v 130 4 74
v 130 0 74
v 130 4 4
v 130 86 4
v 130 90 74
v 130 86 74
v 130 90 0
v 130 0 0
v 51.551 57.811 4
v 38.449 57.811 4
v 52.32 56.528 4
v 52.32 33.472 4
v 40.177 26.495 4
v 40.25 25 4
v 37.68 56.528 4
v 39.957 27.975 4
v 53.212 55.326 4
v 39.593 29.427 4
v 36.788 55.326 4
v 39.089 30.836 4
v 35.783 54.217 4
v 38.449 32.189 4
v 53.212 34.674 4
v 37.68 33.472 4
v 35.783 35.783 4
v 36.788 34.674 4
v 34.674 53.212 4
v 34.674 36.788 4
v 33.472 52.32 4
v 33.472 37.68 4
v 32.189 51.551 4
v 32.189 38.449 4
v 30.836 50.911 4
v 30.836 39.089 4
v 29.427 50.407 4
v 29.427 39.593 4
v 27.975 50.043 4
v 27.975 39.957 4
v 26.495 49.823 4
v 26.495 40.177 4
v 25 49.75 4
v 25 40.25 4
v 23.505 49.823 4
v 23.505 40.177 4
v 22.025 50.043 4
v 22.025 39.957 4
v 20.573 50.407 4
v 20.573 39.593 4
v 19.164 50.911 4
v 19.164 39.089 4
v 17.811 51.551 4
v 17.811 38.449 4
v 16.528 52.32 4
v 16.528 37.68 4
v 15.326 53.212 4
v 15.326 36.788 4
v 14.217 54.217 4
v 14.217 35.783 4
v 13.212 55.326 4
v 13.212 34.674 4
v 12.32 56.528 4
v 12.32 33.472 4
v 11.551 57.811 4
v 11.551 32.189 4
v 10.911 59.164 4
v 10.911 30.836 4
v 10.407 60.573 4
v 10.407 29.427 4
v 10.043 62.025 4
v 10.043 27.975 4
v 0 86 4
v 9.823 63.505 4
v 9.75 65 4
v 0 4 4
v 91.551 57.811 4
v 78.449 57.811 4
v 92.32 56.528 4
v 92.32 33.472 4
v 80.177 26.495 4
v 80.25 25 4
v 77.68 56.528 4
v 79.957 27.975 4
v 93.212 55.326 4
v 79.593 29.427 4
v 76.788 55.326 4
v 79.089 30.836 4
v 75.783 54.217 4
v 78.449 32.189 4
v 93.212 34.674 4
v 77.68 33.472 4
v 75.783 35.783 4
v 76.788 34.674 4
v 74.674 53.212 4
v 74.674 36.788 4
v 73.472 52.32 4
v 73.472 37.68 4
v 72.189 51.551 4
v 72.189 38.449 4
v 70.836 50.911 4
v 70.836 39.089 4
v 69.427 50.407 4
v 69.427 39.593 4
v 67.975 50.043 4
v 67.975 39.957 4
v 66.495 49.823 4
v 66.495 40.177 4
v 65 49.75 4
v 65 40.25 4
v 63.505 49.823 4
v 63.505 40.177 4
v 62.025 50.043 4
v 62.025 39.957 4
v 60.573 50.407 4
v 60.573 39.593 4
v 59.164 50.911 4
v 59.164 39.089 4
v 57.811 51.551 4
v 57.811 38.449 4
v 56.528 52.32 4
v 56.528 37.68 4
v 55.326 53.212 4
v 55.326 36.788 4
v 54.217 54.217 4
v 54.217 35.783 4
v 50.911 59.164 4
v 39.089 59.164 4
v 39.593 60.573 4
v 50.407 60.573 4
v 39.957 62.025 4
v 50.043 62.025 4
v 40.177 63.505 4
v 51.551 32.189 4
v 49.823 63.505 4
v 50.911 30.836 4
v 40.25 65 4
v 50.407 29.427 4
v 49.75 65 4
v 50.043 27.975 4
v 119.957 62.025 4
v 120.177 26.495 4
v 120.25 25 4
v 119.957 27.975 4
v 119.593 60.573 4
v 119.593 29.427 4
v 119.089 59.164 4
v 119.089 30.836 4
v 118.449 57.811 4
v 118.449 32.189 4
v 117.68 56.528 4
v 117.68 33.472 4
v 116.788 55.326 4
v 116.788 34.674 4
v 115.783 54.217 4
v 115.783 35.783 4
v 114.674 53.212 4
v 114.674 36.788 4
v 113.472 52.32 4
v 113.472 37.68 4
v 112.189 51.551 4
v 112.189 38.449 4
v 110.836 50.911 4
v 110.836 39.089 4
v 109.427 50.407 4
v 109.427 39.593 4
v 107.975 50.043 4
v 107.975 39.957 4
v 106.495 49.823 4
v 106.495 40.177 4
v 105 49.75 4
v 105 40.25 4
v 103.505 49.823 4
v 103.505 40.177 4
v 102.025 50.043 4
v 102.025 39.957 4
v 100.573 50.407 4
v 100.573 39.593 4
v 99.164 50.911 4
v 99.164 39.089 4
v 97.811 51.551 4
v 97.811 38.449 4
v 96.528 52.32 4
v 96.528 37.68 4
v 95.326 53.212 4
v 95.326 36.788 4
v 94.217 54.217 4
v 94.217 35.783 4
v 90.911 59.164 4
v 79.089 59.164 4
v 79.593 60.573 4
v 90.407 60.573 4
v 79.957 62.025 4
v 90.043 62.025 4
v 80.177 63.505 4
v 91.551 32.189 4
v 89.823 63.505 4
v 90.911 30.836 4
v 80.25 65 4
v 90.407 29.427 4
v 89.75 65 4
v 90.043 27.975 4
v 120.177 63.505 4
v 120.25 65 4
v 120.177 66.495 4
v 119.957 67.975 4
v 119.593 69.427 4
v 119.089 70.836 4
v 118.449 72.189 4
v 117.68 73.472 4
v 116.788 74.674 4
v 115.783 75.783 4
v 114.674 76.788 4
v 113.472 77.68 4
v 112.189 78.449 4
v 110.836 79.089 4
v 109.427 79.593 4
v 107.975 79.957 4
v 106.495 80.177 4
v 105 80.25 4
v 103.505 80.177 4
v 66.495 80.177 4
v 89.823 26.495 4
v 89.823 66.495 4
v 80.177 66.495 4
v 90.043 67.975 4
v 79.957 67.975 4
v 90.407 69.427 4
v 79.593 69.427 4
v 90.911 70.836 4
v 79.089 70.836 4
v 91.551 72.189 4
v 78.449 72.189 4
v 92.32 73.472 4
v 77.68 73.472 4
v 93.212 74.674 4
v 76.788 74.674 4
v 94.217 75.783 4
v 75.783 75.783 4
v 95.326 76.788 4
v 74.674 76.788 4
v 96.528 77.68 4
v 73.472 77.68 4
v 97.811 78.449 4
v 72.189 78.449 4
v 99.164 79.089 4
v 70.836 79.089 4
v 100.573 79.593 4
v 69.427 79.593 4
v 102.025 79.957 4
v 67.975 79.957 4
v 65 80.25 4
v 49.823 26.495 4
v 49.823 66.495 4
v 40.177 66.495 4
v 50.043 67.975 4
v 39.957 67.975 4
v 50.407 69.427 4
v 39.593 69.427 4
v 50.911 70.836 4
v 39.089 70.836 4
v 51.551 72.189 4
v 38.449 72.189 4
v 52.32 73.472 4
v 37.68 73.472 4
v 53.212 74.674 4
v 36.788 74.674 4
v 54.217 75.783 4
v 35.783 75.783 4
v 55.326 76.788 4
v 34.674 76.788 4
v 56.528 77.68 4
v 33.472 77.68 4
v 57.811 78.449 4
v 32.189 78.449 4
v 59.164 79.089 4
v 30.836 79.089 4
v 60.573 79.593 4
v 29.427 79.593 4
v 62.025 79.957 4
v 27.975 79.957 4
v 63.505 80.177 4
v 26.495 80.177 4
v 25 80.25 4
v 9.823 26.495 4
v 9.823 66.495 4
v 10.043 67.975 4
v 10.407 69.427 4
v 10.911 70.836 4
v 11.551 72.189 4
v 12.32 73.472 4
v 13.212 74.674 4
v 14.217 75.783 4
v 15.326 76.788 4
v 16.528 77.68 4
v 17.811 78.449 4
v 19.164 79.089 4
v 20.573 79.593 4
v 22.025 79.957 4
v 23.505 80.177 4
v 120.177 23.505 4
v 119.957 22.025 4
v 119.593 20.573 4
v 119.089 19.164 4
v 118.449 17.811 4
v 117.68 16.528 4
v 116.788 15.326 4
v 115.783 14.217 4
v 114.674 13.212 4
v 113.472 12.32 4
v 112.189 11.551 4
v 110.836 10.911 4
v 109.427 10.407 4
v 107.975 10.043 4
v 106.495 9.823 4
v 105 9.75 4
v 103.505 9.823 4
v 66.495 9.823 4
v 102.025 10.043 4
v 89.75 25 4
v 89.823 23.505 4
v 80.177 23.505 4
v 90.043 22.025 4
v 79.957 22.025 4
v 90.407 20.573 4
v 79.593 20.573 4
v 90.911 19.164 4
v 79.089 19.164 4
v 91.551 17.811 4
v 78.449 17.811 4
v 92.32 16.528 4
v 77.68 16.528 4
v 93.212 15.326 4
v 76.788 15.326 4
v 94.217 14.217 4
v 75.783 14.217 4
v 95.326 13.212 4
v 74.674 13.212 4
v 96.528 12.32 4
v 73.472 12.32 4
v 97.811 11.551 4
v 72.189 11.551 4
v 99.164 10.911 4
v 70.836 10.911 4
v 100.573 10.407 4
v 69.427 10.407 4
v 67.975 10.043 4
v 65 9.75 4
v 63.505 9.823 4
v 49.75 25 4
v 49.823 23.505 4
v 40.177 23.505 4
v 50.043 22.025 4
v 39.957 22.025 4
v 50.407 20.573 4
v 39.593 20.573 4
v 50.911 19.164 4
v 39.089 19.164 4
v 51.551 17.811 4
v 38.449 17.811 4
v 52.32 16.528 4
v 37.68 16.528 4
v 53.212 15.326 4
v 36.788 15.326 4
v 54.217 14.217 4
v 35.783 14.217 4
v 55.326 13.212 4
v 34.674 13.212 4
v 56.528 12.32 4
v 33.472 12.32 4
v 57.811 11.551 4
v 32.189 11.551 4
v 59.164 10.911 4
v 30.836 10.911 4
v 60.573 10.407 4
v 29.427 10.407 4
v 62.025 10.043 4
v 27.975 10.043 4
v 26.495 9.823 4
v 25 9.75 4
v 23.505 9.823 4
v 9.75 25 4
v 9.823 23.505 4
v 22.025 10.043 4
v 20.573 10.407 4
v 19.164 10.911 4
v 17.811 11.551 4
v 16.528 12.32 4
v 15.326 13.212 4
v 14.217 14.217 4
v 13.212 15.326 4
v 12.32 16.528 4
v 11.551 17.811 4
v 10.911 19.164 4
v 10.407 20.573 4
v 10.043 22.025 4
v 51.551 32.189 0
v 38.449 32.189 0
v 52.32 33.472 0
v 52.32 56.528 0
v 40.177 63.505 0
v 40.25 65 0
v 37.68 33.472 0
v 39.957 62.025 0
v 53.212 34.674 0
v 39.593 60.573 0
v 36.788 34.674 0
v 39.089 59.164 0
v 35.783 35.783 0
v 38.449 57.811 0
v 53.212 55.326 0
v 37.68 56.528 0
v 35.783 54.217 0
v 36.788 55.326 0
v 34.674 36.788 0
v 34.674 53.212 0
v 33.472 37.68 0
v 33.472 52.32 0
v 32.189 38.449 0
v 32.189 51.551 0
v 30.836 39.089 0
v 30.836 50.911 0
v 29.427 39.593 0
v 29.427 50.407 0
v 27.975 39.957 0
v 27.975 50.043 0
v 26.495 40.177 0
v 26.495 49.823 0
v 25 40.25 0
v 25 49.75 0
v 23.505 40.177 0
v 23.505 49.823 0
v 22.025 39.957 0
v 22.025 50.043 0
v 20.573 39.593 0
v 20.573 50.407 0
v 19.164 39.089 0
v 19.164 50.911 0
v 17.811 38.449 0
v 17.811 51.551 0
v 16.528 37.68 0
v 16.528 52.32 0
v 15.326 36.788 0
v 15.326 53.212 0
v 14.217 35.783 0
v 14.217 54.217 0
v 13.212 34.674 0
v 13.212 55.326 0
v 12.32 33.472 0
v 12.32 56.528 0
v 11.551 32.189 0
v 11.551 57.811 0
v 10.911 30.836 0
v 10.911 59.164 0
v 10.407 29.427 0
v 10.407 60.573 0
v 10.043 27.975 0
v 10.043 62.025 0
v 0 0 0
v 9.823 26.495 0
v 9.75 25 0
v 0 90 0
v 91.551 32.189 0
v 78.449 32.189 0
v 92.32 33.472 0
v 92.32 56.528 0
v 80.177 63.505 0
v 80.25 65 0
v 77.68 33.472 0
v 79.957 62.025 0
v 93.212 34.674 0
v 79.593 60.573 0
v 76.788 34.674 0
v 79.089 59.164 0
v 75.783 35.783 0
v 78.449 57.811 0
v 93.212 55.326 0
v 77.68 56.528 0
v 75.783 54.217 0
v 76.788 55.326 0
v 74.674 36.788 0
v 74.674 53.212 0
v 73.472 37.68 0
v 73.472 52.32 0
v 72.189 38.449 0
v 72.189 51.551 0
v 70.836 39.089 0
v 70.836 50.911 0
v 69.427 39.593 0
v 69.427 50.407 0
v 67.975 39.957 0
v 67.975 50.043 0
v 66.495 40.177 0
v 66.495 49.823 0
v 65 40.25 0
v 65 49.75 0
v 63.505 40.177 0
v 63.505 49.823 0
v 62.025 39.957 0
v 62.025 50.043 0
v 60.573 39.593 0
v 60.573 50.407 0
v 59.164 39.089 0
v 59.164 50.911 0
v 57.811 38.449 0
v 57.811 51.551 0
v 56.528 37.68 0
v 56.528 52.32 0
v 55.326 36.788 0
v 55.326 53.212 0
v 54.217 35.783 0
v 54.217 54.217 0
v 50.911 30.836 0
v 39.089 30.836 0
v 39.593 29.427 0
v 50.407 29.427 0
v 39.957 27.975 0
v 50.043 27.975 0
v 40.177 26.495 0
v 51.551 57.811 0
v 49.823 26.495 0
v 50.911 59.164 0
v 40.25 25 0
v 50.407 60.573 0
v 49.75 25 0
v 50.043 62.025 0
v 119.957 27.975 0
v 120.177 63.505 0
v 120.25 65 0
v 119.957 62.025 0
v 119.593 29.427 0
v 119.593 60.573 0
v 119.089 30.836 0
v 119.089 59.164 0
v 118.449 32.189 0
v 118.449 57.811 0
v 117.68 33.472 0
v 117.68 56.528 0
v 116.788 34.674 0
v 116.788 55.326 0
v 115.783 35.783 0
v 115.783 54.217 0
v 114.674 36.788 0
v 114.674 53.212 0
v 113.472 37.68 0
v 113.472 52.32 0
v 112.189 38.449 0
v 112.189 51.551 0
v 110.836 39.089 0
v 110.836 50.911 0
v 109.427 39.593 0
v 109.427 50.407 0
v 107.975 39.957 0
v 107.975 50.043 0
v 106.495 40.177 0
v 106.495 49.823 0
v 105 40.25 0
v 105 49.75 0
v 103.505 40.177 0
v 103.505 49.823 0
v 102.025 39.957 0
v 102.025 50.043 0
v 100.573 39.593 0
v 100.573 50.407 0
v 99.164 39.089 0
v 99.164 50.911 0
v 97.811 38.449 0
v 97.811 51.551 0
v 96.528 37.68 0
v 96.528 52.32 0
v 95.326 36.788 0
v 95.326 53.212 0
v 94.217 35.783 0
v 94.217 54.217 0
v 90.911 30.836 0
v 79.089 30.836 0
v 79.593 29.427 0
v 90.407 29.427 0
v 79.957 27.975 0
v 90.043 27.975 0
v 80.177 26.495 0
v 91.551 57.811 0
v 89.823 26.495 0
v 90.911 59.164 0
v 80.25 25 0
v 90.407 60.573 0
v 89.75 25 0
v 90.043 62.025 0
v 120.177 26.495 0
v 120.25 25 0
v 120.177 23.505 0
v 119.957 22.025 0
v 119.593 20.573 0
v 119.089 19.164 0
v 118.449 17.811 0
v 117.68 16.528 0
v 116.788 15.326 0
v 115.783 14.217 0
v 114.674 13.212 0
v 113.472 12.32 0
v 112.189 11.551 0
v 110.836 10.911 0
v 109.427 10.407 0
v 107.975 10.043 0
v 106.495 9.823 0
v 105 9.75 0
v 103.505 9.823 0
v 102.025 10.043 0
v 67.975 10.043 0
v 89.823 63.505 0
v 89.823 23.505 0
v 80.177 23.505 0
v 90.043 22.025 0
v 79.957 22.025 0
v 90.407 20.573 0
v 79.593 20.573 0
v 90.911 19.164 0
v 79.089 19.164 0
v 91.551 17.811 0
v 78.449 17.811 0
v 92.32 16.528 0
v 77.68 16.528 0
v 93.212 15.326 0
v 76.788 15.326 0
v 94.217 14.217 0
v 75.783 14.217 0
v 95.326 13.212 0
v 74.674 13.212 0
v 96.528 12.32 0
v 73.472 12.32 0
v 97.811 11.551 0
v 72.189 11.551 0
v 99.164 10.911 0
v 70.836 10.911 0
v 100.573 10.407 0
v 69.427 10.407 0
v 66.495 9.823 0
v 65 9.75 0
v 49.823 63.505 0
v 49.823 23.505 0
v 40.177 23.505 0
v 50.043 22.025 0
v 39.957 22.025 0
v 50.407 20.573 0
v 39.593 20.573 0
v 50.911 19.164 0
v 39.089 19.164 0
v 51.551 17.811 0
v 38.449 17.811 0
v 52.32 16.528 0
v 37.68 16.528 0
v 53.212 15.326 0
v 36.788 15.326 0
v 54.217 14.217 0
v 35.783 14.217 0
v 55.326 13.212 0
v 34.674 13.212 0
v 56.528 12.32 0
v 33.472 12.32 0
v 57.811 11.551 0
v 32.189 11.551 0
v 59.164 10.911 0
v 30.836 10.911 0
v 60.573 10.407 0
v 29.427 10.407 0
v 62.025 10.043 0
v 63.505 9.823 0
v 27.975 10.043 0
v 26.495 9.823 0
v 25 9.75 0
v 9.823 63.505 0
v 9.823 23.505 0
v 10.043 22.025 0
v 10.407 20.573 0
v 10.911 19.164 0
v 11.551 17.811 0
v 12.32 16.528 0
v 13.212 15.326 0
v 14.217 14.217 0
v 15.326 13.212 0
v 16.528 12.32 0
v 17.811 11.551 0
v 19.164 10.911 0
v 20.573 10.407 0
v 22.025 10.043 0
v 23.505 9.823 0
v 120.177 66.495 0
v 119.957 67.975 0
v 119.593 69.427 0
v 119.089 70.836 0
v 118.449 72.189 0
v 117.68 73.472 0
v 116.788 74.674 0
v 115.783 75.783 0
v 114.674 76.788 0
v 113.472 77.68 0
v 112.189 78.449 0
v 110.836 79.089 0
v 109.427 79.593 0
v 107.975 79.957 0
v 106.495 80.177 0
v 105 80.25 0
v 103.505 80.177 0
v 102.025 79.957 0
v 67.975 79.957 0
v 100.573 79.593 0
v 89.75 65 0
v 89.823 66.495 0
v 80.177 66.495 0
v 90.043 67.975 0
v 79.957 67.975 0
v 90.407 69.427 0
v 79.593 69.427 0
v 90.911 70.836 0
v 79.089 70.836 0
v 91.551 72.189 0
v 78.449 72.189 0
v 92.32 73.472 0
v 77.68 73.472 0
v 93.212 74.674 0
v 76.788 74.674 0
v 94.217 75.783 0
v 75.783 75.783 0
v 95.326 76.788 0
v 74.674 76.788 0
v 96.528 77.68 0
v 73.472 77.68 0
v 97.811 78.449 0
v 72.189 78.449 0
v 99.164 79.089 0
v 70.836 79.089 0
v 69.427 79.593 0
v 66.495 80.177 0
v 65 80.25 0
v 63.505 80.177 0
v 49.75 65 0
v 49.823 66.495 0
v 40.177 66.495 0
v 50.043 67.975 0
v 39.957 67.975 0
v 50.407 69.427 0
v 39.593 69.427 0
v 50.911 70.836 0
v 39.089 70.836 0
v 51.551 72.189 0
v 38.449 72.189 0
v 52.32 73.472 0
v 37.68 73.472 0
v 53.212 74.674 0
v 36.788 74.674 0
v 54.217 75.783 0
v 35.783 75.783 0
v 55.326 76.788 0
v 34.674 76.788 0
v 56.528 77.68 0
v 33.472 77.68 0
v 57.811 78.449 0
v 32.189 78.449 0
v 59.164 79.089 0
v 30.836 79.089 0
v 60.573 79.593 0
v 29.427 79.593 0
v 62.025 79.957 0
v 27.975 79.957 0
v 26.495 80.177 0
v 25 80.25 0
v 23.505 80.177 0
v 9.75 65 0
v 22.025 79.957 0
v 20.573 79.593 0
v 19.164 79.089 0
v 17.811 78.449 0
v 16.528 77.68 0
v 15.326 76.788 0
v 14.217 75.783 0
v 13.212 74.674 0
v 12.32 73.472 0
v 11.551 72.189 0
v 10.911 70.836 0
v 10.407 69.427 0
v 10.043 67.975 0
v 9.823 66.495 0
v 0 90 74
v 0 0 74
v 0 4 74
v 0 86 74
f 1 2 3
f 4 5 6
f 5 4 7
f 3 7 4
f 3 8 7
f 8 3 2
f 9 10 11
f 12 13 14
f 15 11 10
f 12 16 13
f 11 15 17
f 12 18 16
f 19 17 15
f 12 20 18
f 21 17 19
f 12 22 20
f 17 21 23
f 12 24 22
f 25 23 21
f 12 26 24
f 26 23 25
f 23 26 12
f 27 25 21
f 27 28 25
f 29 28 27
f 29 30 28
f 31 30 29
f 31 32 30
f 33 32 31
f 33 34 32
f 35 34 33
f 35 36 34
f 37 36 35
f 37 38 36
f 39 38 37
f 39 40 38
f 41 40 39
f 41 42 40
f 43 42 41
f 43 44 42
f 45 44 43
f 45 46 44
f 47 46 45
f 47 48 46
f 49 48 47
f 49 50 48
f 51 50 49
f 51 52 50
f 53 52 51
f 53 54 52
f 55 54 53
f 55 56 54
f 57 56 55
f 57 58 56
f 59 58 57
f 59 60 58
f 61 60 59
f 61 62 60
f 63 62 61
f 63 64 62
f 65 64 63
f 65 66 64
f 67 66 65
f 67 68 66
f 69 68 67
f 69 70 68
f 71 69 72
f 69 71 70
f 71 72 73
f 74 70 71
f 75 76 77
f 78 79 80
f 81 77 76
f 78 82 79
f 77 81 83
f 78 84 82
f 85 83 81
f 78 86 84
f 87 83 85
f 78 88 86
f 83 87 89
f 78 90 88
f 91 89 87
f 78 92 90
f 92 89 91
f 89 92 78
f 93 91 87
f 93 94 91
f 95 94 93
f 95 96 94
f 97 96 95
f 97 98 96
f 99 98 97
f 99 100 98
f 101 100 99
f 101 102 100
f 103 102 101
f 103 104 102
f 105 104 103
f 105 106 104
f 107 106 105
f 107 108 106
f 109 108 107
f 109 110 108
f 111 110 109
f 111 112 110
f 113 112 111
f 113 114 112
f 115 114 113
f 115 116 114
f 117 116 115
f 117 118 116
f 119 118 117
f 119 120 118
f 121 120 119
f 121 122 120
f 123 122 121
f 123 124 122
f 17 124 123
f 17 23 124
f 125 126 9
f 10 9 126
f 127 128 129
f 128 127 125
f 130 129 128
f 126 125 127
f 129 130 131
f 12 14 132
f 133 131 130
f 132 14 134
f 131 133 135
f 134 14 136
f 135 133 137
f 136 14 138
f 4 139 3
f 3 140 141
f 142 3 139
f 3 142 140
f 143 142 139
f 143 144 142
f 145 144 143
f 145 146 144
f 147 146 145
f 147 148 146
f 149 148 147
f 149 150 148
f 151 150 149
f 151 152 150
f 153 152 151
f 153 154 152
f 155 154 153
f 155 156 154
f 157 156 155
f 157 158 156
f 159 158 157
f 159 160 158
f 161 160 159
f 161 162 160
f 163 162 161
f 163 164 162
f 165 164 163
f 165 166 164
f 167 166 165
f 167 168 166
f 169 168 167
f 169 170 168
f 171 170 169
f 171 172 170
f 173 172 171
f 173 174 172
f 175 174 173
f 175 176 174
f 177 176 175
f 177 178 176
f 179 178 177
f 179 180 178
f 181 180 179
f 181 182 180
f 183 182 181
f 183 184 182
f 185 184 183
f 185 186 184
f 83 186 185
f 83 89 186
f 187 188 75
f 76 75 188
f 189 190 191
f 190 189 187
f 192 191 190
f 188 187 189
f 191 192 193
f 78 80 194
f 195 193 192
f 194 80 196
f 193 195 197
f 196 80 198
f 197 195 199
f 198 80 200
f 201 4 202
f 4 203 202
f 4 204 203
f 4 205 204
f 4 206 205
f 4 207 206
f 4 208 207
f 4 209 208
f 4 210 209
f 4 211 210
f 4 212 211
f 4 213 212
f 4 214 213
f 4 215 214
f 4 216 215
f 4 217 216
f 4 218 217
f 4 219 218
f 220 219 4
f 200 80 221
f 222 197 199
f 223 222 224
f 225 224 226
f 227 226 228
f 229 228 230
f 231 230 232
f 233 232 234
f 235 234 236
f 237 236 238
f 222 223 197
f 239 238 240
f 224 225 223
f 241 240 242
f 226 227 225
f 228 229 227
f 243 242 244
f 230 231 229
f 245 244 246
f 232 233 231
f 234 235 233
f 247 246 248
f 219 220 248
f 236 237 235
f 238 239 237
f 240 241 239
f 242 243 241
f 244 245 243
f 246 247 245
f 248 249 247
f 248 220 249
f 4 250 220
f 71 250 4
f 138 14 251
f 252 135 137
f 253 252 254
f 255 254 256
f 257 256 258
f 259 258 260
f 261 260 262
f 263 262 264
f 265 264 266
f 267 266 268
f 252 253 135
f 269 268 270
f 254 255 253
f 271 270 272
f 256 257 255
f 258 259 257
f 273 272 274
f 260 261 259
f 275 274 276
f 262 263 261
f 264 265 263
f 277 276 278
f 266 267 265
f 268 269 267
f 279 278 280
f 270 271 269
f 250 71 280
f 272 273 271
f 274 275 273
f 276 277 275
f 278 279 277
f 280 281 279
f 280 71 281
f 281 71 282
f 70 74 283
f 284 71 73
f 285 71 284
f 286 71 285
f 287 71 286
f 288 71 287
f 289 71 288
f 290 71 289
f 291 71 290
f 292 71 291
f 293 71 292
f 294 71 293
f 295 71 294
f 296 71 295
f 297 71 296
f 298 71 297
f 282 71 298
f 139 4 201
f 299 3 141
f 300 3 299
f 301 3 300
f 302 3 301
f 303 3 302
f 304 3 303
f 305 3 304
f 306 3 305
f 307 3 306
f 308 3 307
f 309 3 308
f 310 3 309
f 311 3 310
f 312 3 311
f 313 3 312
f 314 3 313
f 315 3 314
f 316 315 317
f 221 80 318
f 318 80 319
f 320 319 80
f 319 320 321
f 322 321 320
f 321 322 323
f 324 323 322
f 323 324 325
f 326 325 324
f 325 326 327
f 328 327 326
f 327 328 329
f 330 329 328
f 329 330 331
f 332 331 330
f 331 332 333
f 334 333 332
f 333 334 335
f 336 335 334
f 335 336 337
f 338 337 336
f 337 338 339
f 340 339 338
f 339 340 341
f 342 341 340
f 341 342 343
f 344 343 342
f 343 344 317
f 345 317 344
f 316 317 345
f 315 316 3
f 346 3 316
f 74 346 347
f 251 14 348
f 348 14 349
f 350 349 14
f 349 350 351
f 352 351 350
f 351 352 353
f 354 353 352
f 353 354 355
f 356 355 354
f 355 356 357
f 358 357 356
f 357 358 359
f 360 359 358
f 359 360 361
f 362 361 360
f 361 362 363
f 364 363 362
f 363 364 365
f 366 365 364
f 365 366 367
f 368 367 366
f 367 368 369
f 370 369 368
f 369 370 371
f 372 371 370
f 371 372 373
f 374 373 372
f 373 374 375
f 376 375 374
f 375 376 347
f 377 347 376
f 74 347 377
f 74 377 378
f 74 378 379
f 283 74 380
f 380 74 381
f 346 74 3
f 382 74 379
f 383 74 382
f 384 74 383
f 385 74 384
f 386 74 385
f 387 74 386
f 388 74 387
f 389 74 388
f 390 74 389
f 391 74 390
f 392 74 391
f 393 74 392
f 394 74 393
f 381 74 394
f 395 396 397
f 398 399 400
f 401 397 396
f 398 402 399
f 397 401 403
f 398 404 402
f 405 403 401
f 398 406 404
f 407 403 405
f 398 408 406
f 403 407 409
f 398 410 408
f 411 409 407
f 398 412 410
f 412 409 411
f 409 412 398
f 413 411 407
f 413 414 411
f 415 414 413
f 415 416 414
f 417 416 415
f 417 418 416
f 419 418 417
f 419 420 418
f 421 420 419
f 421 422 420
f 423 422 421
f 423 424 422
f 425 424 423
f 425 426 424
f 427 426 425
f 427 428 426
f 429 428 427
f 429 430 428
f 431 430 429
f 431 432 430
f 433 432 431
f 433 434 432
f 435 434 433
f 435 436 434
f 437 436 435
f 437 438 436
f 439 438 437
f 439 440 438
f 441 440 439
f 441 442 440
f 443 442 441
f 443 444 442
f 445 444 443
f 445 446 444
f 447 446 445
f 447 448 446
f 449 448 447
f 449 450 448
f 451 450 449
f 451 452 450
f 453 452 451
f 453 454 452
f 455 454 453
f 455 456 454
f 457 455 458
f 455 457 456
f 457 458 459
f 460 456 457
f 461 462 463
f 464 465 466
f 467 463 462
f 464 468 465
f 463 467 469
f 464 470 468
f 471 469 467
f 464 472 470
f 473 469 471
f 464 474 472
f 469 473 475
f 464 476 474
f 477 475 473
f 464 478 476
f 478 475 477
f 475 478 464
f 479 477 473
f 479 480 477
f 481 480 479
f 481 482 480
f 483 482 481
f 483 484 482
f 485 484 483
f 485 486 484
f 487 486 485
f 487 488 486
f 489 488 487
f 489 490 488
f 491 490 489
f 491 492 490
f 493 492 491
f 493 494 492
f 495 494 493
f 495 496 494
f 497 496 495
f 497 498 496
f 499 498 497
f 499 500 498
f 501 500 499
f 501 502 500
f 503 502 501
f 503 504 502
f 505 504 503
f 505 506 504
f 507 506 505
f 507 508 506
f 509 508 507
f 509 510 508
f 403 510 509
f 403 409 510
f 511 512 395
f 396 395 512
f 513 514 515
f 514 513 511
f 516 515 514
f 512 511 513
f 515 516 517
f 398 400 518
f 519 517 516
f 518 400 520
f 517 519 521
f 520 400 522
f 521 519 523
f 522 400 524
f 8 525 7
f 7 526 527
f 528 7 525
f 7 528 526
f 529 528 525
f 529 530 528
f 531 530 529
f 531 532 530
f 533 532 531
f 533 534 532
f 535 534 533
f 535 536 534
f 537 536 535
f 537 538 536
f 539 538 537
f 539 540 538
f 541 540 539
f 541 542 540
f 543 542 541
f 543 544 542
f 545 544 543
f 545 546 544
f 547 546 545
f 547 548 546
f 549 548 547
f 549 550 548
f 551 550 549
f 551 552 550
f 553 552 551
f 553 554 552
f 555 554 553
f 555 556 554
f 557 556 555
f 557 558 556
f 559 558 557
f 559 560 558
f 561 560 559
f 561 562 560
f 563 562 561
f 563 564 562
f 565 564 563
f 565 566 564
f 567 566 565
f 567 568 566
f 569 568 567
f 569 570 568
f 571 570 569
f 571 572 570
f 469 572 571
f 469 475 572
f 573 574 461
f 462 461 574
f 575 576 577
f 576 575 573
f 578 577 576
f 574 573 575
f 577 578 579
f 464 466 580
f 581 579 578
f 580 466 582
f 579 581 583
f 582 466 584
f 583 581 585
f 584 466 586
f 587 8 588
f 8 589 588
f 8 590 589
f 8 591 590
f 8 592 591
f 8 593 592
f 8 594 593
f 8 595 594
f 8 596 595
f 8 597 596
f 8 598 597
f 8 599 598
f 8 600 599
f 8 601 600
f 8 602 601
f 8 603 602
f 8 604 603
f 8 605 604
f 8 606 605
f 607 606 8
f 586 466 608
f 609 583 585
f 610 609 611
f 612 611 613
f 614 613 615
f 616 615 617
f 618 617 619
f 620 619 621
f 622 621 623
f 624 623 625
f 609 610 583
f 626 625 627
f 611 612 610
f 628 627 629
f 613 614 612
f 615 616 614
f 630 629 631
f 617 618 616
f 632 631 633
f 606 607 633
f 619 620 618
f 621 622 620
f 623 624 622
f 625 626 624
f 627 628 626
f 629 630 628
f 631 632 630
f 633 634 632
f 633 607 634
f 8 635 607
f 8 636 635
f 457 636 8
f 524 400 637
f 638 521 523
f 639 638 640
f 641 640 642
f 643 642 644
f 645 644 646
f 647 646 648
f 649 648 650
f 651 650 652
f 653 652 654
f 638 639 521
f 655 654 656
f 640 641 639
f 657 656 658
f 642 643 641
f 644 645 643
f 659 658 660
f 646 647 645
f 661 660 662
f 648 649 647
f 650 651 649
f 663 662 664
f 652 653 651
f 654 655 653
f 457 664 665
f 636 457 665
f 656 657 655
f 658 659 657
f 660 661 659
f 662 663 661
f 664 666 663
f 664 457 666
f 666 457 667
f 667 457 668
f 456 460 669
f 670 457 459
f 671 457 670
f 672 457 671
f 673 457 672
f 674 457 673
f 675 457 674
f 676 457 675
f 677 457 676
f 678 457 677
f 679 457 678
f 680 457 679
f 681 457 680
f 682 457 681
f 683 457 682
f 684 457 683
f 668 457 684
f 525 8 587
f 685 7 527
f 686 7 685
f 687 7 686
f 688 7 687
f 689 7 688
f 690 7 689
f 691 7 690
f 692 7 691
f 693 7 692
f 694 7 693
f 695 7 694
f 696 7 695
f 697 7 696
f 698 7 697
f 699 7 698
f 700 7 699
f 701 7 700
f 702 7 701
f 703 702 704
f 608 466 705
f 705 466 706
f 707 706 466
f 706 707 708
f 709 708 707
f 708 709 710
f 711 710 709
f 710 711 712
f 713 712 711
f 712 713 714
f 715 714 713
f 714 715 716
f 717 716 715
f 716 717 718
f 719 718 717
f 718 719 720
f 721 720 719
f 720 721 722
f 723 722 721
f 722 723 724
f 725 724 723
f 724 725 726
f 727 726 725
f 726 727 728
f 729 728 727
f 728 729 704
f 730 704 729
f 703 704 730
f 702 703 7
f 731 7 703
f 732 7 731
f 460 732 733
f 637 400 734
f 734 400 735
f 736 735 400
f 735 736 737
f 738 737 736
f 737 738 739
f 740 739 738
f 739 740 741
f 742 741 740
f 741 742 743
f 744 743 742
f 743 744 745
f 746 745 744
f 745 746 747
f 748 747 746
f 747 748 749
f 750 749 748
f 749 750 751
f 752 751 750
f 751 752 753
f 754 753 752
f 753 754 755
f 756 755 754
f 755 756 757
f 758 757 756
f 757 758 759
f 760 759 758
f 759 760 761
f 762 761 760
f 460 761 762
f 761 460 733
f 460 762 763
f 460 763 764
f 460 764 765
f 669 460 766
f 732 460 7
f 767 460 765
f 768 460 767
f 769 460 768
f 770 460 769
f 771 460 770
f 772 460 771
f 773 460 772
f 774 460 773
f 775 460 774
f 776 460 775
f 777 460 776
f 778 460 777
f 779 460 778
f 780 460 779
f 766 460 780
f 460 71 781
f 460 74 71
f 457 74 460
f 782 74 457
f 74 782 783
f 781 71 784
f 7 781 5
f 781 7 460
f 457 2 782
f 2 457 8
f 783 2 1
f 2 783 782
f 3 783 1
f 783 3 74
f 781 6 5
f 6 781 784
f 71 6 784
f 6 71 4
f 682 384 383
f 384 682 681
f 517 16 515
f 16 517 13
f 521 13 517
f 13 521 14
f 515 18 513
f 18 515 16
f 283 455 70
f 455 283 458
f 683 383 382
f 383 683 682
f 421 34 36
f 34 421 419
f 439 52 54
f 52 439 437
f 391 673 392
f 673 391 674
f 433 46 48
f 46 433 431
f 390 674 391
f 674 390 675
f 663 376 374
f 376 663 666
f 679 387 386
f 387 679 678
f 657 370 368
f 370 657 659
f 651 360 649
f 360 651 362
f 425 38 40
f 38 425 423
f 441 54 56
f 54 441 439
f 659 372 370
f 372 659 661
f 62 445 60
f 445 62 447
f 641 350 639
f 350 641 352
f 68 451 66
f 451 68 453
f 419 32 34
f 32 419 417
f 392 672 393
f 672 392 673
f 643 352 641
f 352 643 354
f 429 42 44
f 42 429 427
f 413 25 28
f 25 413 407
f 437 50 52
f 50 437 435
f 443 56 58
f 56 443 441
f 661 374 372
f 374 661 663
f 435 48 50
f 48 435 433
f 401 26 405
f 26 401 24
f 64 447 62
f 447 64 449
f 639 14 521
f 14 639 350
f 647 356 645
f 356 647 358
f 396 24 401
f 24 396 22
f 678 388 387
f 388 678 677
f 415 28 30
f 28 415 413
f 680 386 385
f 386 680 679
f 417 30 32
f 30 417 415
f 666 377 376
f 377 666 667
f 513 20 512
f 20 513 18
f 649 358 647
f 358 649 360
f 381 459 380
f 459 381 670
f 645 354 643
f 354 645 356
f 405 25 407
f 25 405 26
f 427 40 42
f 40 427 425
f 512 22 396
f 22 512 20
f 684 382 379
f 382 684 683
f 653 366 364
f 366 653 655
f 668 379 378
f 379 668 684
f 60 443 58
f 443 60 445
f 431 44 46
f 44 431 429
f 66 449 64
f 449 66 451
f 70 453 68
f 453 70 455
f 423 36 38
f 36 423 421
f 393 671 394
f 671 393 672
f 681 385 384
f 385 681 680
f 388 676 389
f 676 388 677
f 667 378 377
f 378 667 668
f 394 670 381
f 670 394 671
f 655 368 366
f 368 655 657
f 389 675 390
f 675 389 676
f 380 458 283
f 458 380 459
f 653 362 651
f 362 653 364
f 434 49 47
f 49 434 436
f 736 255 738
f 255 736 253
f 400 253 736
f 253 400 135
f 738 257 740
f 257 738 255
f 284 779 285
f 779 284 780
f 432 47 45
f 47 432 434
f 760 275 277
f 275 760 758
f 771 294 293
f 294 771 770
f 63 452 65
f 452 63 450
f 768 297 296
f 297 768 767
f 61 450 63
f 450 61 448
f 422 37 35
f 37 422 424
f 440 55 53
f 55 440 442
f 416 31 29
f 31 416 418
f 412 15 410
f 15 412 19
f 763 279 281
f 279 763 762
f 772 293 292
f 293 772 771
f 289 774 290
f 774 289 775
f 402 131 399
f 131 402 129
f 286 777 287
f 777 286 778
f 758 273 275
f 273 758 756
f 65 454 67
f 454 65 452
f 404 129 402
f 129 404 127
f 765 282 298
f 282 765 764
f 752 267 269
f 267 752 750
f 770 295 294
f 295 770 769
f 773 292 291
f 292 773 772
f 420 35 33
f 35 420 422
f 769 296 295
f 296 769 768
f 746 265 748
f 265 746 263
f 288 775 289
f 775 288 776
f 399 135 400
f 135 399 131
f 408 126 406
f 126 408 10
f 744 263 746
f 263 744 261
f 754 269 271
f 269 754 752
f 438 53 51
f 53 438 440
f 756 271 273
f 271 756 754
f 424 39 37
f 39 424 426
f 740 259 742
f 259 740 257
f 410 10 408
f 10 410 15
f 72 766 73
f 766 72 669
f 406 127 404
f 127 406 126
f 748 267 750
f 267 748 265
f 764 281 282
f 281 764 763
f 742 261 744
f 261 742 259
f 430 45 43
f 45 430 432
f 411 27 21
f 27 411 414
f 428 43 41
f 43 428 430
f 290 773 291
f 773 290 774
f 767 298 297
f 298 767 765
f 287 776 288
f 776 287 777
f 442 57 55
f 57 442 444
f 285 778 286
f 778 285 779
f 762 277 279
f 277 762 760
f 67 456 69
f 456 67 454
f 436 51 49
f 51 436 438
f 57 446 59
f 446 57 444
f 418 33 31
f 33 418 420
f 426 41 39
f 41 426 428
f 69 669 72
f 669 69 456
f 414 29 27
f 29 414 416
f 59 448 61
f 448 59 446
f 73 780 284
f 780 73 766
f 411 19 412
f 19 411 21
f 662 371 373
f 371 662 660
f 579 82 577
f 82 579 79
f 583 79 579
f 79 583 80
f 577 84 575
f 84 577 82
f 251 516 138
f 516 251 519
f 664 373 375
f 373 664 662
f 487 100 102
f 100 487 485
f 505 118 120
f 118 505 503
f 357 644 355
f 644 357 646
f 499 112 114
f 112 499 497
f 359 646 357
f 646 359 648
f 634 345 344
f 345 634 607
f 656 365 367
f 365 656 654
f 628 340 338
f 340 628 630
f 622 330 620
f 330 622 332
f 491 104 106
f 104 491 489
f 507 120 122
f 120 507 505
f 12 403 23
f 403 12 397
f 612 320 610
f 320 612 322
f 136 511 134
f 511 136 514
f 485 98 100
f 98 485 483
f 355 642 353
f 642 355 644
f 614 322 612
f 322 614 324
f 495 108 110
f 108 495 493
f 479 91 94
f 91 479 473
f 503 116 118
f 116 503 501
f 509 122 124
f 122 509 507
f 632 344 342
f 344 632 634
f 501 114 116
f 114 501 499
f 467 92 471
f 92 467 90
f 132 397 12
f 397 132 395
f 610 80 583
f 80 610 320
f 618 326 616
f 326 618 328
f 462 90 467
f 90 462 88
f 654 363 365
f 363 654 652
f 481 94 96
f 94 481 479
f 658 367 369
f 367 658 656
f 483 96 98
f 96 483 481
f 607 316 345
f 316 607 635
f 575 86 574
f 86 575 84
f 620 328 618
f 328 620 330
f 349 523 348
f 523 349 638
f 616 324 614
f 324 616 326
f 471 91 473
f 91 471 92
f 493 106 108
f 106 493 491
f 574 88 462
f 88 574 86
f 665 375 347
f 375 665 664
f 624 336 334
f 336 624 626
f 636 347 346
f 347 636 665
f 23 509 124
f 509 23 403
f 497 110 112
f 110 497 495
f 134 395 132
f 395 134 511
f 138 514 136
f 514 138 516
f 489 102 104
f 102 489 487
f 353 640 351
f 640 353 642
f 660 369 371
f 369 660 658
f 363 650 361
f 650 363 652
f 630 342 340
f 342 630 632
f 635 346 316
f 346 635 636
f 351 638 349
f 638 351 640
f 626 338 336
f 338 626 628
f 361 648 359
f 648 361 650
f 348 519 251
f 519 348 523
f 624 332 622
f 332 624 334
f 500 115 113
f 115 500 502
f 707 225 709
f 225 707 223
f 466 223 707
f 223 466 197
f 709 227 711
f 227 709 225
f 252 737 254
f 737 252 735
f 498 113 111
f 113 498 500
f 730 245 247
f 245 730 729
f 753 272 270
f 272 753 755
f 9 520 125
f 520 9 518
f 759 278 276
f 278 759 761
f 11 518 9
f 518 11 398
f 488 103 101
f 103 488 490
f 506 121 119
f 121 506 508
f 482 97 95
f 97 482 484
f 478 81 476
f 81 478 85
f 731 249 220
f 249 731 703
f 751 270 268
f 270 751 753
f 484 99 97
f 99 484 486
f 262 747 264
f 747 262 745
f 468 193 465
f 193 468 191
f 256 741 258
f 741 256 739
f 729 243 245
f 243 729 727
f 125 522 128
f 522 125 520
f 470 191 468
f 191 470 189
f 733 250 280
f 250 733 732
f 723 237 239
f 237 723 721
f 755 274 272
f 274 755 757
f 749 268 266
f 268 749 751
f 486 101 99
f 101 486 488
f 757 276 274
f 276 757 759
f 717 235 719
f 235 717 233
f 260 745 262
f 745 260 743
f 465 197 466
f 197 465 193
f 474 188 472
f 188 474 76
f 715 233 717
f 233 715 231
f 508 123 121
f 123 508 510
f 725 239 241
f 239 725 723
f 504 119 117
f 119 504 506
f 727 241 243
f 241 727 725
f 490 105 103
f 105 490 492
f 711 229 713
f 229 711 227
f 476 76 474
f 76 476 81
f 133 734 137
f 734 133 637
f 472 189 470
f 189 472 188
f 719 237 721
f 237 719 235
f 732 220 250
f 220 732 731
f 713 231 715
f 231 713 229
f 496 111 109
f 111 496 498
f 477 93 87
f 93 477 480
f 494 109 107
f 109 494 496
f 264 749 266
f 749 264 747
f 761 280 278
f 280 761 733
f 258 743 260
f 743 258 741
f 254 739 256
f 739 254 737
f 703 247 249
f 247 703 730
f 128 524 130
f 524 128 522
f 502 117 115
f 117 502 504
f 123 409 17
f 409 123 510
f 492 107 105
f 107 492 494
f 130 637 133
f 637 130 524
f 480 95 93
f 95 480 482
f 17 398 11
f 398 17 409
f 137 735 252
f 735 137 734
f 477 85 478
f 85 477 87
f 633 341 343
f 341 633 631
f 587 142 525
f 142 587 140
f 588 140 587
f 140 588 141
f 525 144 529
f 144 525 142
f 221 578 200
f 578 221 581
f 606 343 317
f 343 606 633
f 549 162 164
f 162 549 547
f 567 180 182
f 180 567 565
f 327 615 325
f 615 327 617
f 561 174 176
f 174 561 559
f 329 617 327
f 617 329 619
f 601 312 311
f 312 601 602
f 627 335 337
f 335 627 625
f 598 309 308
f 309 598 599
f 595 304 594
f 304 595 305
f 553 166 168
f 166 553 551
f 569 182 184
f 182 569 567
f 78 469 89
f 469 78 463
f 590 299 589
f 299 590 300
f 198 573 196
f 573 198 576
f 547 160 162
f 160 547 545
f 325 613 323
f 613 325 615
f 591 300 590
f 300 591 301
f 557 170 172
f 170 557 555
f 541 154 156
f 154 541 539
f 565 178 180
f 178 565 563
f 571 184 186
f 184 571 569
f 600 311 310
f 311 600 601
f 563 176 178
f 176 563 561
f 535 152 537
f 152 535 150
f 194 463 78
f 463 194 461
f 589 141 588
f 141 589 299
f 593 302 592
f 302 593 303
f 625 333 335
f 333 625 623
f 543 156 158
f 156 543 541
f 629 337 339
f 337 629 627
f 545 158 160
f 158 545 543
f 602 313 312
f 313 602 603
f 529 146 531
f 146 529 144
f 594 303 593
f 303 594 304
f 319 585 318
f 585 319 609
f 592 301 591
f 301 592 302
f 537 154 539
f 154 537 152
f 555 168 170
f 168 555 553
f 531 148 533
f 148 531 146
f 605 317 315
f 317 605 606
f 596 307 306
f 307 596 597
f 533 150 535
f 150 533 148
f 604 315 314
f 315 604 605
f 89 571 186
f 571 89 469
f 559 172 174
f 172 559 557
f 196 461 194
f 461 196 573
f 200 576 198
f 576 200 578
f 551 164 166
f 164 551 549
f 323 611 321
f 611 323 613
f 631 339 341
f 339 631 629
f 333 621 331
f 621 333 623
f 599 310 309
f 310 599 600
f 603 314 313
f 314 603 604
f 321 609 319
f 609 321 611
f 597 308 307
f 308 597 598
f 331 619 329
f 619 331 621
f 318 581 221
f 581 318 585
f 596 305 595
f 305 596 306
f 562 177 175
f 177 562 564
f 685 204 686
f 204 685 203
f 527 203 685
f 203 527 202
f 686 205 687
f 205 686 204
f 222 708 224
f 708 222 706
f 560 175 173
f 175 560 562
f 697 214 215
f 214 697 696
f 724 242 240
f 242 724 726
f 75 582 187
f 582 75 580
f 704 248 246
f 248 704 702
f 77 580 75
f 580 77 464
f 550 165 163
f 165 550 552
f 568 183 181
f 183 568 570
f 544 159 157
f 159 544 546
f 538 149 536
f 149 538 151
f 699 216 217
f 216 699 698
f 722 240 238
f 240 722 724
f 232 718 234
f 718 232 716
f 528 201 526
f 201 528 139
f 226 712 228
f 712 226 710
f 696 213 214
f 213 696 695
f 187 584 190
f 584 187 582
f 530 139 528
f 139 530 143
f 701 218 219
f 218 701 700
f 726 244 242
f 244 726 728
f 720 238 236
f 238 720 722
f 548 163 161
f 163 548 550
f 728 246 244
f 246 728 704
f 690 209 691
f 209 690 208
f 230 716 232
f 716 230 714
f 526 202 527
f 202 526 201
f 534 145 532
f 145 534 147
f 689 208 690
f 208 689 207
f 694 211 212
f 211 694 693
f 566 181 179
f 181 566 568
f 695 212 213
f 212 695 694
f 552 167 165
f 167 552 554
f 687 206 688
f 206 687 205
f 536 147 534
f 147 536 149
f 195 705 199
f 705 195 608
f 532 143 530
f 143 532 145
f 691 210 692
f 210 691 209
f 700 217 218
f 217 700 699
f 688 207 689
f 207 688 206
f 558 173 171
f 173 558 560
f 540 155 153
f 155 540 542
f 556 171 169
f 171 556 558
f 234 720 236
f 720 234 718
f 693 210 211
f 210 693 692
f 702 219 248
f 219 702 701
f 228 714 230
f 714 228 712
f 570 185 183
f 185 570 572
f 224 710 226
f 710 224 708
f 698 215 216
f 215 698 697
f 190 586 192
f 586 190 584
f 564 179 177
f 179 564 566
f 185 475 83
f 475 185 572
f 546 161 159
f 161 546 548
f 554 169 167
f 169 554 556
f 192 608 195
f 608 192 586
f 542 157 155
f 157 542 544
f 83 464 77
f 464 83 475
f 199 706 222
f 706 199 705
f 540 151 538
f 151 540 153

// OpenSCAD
// --- Dimensions (mm) ---
plate_width = 130;        // X dimension of the plate
plate_depth = 90;         // Y dimension of the plate
plate_thickness = 4;      // Z thickness of the plate
wall_height = 70;         // Height of the side walls from the plate
wall_thickness = 4;       // Thickness of the side walls

hole_diameter = 30.5;      // Diameter of the tube holes
hole_spacing_x = 40;       // Center-to-center distance along X
hole_spacing_y = 40;       // Center-to-center distance along Y
num_holes_x = 3;           // Number of holes in X direction
num_holes_y = 2;           // Number of holes in Y direction

// --- Constants ---
$fn = 64;

// --- Modeling Logic ---
// The user specifies the part is printed "upside down" and then flipped.
// In print orientation: 
// - Plate is at Z = 0 to 4.
// - Walls rise from the plate to Z = 70.
// - This means the "top" of the rack (where tubes sit) is at Z = 70.
// - When flipped, the walls become the base.

module rack() {
    difference() {
        // Main Body: Plate + Walls
        union() {
            // The Base Plate
            cube([plate_width, plate_depth, plate_thickness]);
            
            // The Two Long Walls
            // Wall 1: Along Y=0 edge
            cube([plate_width, wall_thickness, plate_thickness + wall_height]);
            
            // Wall 2: Along Y=plate_depth edge
            translate([0, plate_depth - wall_thickness, 0])
                cube([plate_width, wall_thickness, plate_thickness + wall_height]);
        }

        // The Six Holes
        // We calculate the starting position to ensure the grid is centered on the plate.
        // Center of plate is (plate_width/2, plate_depth/2).
        // Grid offset calculation:
        // Total span of holes in X = (num_holes_x - 1) * hole_spacing_x
        // Total span of holes in Y = (num_holes_y - 1) * hole_spacing_y
        
        start_x = (plate_width / 2) - ((num_holes_x - 1) * hole_spacing_x / 2) - (hole_diameter / 2);
        start_y = (plate_depth / 2) - ((num_holes_y - 1) * hole_spacing_y / 2) - (hole_diameter / 2);

        for (i = [0 : num_holes_x - 1]) {
            for (j = [0 : num_holes_y - 1]) {
                translate([
                    start_x + (i * hole_spacing_x) + (hole_diameter / 2),
                    start_y + (j * hole_spacing_y) + (hole_diameter / 2),
                    -1 // Extend slightly below plate
                ])
                cylinder(h = plate_thickness + 2, d = hole_diameter);
            }
        }
    }
}

// Render the part
// Orientation: Plate on XY plane, walls rising in +Z
rack();
